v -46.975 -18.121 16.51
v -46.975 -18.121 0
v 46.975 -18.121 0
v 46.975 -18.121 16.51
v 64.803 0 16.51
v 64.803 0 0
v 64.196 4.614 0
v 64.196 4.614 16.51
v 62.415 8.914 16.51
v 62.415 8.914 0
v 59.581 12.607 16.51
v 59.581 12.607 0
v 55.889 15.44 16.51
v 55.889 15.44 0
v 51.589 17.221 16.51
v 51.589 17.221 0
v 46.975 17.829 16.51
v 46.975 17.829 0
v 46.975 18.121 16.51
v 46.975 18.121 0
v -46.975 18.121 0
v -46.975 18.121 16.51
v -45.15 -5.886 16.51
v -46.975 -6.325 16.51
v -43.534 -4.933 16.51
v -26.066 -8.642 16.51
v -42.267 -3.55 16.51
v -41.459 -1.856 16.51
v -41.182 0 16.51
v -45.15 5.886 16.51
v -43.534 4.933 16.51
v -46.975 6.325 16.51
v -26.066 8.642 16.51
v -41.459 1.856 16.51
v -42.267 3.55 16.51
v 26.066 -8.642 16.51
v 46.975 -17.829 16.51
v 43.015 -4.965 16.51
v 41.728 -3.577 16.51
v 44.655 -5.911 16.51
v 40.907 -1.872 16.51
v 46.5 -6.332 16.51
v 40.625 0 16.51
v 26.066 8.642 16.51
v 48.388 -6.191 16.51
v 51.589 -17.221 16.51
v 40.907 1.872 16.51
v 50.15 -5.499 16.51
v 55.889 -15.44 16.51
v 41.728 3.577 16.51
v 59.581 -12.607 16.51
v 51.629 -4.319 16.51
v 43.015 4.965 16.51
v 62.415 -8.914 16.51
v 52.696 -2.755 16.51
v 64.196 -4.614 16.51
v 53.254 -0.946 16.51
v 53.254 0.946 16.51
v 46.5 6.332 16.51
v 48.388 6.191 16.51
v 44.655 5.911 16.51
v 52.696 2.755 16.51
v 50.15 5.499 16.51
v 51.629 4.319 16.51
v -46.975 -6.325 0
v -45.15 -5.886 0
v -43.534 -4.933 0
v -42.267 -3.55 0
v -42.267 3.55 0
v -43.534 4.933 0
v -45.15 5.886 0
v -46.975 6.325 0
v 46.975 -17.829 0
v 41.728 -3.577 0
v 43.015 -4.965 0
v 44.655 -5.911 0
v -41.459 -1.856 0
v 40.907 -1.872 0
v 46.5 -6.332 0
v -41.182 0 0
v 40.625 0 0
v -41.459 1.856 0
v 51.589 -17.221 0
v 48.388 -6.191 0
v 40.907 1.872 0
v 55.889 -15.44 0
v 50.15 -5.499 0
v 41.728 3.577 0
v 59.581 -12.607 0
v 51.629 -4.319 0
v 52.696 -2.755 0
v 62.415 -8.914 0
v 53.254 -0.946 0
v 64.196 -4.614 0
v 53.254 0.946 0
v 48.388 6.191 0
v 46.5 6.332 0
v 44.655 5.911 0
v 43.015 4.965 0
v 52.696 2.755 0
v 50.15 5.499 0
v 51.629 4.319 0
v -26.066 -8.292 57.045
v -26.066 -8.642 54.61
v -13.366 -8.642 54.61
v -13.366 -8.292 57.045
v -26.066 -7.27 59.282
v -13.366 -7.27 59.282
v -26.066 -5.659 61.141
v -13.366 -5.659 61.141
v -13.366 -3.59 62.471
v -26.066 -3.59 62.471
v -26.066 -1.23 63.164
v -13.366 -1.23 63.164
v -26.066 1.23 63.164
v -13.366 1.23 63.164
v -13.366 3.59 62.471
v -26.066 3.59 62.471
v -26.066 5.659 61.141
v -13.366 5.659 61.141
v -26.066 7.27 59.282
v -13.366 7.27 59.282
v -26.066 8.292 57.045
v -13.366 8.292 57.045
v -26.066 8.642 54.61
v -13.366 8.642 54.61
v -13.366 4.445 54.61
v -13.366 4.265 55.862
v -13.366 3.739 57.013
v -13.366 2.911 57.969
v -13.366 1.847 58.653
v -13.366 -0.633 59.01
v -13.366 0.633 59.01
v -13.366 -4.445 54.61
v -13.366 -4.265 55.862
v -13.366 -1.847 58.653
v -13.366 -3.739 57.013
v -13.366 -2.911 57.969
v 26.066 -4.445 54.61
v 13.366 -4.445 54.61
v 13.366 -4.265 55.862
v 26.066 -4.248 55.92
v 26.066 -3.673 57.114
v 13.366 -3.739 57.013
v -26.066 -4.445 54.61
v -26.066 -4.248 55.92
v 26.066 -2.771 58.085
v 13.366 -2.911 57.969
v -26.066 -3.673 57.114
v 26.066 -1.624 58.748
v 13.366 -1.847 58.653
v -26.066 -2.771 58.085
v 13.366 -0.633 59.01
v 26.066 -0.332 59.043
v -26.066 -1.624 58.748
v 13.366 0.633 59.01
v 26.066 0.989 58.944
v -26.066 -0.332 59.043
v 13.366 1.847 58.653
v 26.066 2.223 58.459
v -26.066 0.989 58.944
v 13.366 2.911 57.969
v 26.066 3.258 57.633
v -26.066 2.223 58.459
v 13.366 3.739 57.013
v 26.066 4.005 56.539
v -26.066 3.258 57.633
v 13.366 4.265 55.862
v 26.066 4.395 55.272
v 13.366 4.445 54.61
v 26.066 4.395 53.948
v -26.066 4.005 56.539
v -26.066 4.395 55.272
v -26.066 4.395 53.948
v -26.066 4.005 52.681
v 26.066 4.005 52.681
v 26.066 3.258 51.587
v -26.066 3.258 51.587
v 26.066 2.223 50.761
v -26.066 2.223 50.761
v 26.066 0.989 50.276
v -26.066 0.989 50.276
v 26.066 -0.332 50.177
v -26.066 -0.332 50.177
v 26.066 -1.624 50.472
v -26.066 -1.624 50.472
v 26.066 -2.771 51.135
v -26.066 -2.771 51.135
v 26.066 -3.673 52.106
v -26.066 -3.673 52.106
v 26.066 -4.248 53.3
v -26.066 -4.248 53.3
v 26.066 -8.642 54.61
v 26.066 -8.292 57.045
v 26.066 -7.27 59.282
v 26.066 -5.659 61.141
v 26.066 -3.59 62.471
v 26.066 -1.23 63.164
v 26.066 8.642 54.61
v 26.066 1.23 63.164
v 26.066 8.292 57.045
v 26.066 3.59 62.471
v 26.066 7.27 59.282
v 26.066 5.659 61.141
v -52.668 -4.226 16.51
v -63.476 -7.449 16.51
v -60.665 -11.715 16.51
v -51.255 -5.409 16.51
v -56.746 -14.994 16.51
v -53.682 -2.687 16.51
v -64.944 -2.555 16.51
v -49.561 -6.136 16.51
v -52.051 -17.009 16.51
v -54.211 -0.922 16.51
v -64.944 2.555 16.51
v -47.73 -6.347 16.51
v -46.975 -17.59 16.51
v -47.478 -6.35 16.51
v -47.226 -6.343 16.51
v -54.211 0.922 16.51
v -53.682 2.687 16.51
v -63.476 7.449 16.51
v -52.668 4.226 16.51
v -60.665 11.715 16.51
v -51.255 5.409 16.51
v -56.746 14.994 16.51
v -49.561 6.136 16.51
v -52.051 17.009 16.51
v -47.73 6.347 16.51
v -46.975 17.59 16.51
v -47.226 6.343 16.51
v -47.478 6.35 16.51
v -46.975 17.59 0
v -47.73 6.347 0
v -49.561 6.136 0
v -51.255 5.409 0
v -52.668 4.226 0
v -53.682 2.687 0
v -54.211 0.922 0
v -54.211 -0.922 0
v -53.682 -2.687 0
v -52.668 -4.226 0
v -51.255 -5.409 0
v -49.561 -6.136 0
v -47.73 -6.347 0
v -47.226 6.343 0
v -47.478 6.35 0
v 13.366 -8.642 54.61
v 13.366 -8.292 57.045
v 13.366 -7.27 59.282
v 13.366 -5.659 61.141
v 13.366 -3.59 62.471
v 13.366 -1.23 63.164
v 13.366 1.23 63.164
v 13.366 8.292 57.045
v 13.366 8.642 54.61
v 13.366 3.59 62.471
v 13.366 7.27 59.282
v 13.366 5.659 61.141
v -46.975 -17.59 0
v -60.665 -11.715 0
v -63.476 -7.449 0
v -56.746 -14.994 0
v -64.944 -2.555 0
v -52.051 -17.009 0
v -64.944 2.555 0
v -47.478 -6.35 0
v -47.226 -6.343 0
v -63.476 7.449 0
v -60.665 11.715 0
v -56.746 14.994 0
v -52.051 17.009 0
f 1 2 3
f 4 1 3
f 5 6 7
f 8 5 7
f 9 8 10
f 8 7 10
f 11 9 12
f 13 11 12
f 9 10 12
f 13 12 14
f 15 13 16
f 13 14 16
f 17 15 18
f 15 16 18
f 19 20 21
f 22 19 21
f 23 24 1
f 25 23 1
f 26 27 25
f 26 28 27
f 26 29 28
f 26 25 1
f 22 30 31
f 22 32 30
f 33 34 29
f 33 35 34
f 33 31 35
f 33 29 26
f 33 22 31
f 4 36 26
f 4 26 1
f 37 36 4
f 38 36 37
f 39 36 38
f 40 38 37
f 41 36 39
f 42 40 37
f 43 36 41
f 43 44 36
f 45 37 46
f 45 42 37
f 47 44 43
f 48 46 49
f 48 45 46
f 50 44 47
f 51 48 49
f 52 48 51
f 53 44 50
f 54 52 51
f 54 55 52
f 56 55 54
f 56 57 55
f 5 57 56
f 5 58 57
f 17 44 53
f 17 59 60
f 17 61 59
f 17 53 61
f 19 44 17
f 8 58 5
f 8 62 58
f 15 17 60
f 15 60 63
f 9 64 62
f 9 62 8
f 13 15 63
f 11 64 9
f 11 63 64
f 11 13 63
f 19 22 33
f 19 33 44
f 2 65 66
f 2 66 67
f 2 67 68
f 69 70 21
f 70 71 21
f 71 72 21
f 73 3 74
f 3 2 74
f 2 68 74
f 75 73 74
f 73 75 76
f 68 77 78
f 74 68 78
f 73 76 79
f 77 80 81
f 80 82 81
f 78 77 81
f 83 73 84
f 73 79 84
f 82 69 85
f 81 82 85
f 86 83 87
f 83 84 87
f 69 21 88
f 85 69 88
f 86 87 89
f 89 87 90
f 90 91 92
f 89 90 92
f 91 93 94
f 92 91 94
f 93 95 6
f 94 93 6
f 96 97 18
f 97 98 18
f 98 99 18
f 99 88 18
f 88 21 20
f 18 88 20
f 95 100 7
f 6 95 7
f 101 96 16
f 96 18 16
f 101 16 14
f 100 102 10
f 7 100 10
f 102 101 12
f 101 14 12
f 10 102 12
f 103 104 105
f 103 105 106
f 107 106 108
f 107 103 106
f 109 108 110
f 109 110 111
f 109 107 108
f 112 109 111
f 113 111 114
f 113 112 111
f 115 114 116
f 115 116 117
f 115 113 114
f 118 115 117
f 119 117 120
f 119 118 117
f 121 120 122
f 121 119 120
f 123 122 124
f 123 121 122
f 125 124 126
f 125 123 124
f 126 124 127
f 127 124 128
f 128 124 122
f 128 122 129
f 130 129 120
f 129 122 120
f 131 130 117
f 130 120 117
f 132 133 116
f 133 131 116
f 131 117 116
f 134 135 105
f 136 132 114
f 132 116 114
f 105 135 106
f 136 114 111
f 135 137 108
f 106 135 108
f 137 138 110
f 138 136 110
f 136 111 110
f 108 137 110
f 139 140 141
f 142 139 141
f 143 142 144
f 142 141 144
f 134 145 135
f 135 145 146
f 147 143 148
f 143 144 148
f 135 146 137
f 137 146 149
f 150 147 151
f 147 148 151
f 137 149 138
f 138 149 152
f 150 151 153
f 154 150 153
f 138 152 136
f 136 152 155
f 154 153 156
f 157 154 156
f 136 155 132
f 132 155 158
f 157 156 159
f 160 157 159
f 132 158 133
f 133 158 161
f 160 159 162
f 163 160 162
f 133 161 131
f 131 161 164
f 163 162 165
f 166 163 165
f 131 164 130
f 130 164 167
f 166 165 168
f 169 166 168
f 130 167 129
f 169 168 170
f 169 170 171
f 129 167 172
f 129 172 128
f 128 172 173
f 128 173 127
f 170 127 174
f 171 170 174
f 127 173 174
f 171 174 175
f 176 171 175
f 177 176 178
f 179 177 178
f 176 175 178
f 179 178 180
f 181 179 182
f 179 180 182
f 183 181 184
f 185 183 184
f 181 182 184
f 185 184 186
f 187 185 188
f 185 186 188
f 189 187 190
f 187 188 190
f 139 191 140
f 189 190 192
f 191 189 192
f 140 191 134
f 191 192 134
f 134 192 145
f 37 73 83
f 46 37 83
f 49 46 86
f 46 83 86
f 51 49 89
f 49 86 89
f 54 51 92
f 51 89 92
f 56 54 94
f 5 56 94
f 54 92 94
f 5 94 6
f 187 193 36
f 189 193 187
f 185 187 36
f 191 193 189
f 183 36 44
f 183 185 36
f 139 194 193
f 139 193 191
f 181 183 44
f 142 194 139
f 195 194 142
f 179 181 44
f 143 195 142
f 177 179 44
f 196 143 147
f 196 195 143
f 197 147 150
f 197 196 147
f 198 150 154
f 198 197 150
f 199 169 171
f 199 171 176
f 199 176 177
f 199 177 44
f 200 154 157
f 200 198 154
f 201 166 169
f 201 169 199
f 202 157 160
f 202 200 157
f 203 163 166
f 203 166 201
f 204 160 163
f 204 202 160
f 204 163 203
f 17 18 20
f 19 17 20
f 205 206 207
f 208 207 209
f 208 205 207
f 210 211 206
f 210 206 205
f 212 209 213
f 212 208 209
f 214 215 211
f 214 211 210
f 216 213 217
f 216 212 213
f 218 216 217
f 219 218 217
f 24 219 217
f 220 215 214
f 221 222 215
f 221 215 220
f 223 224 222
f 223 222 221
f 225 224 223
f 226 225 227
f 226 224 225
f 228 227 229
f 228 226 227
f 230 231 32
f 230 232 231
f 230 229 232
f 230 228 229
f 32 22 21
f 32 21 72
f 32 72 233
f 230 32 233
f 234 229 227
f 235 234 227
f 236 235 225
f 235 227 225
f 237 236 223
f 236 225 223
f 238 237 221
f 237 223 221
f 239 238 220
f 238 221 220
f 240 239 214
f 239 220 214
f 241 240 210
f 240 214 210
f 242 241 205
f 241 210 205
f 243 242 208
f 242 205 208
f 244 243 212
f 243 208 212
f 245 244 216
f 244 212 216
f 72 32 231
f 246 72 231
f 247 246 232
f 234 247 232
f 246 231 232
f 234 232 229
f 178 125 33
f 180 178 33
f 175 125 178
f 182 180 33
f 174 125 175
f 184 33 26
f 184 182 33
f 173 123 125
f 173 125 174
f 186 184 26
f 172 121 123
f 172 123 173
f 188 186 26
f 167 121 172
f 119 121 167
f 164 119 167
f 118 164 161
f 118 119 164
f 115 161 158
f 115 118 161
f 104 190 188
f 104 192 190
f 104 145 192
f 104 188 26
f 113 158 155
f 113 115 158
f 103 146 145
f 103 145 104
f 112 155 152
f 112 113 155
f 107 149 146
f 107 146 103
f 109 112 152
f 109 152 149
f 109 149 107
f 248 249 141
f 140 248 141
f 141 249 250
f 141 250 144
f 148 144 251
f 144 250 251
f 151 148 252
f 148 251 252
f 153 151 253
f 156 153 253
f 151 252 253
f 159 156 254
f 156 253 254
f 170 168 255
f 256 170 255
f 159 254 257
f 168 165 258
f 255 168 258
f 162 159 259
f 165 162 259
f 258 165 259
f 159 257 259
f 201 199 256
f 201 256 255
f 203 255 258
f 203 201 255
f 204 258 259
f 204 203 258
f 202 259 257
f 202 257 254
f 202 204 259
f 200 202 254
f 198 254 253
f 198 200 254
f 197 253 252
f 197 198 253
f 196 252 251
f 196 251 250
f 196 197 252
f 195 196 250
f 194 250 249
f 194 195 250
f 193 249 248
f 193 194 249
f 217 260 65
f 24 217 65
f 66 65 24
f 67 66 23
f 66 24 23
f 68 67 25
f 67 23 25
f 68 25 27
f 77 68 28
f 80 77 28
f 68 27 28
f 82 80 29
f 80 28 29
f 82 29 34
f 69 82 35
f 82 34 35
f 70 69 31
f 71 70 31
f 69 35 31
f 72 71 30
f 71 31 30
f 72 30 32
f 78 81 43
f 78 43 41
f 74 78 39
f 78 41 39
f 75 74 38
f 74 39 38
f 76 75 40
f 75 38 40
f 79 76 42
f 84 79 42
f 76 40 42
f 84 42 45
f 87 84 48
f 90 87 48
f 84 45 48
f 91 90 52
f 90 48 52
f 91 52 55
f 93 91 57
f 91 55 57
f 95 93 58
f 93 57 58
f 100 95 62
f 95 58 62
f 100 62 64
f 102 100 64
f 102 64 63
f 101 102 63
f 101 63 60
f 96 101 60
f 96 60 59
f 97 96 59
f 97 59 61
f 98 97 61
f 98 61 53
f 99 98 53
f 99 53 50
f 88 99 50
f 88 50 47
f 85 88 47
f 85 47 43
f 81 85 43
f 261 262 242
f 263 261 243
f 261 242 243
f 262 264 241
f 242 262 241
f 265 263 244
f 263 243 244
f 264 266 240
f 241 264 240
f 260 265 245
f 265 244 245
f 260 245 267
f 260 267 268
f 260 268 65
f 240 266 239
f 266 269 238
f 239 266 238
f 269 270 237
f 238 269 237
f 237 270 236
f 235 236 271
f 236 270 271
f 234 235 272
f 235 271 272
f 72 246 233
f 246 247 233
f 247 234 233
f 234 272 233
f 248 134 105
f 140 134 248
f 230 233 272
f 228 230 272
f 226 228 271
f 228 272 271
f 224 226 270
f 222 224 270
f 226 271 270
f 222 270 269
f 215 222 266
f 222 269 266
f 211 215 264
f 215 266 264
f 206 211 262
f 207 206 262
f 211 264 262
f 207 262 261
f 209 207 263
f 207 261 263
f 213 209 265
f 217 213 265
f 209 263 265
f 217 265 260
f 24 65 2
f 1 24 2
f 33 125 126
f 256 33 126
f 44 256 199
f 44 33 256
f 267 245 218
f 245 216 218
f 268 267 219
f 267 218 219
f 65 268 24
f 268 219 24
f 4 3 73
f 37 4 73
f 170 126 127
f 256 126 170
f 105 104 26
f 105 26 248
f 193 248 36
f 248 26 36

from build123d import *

# Parameters (mm, degrees)
F4_DEPTH  = 16.51
F6_DEPTH  = 16.51
F7_D      = 12.7
F8_D      = 12.7
F9_D      = 12.7
F9_2_D    = 12.7
F10_W     = 52.1319508553
F10_H     = 17.2843895853
F11_DEPTH = 38.1
F13_DEPTH = 12.7
F15_DEPTH = 12.7
F17_D     = 8.89


# Not quite as in the source:
# - the program builds the solid bodies; features that only make, move or delete a surface that nothing else refers to are left out


with BuildPart() as f4:
    # F1 (on face) → F4 (new body)
    with BuildSketch(Plane.XY):
        with BuildLine():
            ThreePointArc((46.9745136797, -17.8288787387), (29.1456349411, 0), (46.9745136797, 17.8288787387))
            Line((46.9745136797, 17.8288787387), (46.9745136797, 18.1207321584))
            Line((46.9745136797, 18.1207321584), (-46.9745136797, 18.1207321584))
            Line((-46.9745136797, 18.1207321584), (-46.9745136797, -18.1207321584))
            Line((-46.9745136797, -18.1207321584), (46.9745136797, -18.1207321584))
            Line((46.9745136797, -18.1207321584), (46.9745136797, -17.8288787387))
        make_face()
    extrude(amount=F4_DEPTH)

    # F1 (on face) → F6 (join)
    with BuildSketch(Plane.XY):
        with BuildLine():
            ThreePointArc((46.9745136797, -17.8288787387), (59.5814347368, -12.6069210571), (64.8033924184, 0))
            ThreePointArc((64.8033924184, 0), (59.5814347368, 12.6069210571), (46.9745136797, 17.8288787387))
            Line((46.9745136797, 17.8288787387), (46.9745136797, -17.8288787387))
        make_face()
        with BuildLine():
            Line((46.9745136797, -17.8288787387), (46.9745136797, 17.8288787387))
            ThreePointArc((46.9745136797, 17.8288787387), (29.1456349411, 0), (46.9745136797, -17.8288787387))
        make_face()
    extrude(amount=F6_DEPTH)

    # F8 (through all)
    with Locations(Plane(origin=(0, 0, 0), x_dir=(1, 0, 0), z_dir=(0, 0, -1))):
        with Locations((46.9745136797, 0)):
            Hole(F8_D / 2)

    # F9 (through all)
    with Locations(Plane(origin=(0, 0, 0), x_dir=(1, 0, 0), z_dir=(0, 0, -1))):
        with Locations((-47.5320741534, 0)):
            Hole(F9_D / 2)

    # F10 (on face) → F11 (join)
    with BuildSketch(Plane.XY.offset(16.51)):
        Rectangle(F10_W, F10_H)
    extrude(amount=F11_DEPTH)

    # F12 (on face) → F13 (join)
    with BuildSketch(Plane(origin=(-26.0659754276, 0, 0), x_dir=(0, -1, 0), z_dir=(-1, 0, 0))):
        with BuildLine():
            Line((-8.6421947926, 54.61), (8.6421947926, 54.61))
            ThreePointArc((8.6421947926, 54.61), (0, 63.2521947926), (-8.6421947926, 54.61))
        make_face()
    extrude(amount=-F13_DEPTH)

    # F14 (on face) → F15 (join)
    with BuildSketch(Plane.YZ.offset(26.0659754276)):
        with BuildLine():
            Line((-8.6421947926, 54.61), (8.6421947926, 54.61))
            ThreePointArc((8.6421947926, 54.61), (0, 63.2521947926), (-8.6421947926, 54.61))
        make_face()
    extrude(amount=-F15_DEPTH)

    # F17 (through all)
    with Locations(Plane.YZ.offset(26.0659754276)):
        with Locations((0, 54.61)):
            Hole(F17_D / 2)


with BuildPart() as f4b:
    # F2 (on face) → F4, piece 2 (new body)
    with BuildSketch(Plane.XY):
        with BuildLine():
            Line((-46.9745136797, -17.5897021865), (-46.9745136797, 17.5897021865))
            ThreePointArc((-46.9745136797, 17.5897021865), (-65.1306109304, 0), (-46.9745136797, -17.5897021865))
        make_face()
    extrude(amount=F4_DEPTH)

    # F7 (through all)
    with Locations(Plane(origin=(0, 0, 0), x_dir=(1, 0, 0), z_dir=(0, 0, -1))):
        with Locations((-47.9283444583, 0)):
            Hole(F7_D / 2)

    # F9#2 (through all)
    with Locations(Plane(origin=(0, 0, 0), x_dir=(1, 0, 0), z_dir=(0, 0, -1))):
        with Locations((-47.5320741534, 0)):
            Hole(F9_2_D / 2)


solid = Compound([f4.part, f4b.part])
